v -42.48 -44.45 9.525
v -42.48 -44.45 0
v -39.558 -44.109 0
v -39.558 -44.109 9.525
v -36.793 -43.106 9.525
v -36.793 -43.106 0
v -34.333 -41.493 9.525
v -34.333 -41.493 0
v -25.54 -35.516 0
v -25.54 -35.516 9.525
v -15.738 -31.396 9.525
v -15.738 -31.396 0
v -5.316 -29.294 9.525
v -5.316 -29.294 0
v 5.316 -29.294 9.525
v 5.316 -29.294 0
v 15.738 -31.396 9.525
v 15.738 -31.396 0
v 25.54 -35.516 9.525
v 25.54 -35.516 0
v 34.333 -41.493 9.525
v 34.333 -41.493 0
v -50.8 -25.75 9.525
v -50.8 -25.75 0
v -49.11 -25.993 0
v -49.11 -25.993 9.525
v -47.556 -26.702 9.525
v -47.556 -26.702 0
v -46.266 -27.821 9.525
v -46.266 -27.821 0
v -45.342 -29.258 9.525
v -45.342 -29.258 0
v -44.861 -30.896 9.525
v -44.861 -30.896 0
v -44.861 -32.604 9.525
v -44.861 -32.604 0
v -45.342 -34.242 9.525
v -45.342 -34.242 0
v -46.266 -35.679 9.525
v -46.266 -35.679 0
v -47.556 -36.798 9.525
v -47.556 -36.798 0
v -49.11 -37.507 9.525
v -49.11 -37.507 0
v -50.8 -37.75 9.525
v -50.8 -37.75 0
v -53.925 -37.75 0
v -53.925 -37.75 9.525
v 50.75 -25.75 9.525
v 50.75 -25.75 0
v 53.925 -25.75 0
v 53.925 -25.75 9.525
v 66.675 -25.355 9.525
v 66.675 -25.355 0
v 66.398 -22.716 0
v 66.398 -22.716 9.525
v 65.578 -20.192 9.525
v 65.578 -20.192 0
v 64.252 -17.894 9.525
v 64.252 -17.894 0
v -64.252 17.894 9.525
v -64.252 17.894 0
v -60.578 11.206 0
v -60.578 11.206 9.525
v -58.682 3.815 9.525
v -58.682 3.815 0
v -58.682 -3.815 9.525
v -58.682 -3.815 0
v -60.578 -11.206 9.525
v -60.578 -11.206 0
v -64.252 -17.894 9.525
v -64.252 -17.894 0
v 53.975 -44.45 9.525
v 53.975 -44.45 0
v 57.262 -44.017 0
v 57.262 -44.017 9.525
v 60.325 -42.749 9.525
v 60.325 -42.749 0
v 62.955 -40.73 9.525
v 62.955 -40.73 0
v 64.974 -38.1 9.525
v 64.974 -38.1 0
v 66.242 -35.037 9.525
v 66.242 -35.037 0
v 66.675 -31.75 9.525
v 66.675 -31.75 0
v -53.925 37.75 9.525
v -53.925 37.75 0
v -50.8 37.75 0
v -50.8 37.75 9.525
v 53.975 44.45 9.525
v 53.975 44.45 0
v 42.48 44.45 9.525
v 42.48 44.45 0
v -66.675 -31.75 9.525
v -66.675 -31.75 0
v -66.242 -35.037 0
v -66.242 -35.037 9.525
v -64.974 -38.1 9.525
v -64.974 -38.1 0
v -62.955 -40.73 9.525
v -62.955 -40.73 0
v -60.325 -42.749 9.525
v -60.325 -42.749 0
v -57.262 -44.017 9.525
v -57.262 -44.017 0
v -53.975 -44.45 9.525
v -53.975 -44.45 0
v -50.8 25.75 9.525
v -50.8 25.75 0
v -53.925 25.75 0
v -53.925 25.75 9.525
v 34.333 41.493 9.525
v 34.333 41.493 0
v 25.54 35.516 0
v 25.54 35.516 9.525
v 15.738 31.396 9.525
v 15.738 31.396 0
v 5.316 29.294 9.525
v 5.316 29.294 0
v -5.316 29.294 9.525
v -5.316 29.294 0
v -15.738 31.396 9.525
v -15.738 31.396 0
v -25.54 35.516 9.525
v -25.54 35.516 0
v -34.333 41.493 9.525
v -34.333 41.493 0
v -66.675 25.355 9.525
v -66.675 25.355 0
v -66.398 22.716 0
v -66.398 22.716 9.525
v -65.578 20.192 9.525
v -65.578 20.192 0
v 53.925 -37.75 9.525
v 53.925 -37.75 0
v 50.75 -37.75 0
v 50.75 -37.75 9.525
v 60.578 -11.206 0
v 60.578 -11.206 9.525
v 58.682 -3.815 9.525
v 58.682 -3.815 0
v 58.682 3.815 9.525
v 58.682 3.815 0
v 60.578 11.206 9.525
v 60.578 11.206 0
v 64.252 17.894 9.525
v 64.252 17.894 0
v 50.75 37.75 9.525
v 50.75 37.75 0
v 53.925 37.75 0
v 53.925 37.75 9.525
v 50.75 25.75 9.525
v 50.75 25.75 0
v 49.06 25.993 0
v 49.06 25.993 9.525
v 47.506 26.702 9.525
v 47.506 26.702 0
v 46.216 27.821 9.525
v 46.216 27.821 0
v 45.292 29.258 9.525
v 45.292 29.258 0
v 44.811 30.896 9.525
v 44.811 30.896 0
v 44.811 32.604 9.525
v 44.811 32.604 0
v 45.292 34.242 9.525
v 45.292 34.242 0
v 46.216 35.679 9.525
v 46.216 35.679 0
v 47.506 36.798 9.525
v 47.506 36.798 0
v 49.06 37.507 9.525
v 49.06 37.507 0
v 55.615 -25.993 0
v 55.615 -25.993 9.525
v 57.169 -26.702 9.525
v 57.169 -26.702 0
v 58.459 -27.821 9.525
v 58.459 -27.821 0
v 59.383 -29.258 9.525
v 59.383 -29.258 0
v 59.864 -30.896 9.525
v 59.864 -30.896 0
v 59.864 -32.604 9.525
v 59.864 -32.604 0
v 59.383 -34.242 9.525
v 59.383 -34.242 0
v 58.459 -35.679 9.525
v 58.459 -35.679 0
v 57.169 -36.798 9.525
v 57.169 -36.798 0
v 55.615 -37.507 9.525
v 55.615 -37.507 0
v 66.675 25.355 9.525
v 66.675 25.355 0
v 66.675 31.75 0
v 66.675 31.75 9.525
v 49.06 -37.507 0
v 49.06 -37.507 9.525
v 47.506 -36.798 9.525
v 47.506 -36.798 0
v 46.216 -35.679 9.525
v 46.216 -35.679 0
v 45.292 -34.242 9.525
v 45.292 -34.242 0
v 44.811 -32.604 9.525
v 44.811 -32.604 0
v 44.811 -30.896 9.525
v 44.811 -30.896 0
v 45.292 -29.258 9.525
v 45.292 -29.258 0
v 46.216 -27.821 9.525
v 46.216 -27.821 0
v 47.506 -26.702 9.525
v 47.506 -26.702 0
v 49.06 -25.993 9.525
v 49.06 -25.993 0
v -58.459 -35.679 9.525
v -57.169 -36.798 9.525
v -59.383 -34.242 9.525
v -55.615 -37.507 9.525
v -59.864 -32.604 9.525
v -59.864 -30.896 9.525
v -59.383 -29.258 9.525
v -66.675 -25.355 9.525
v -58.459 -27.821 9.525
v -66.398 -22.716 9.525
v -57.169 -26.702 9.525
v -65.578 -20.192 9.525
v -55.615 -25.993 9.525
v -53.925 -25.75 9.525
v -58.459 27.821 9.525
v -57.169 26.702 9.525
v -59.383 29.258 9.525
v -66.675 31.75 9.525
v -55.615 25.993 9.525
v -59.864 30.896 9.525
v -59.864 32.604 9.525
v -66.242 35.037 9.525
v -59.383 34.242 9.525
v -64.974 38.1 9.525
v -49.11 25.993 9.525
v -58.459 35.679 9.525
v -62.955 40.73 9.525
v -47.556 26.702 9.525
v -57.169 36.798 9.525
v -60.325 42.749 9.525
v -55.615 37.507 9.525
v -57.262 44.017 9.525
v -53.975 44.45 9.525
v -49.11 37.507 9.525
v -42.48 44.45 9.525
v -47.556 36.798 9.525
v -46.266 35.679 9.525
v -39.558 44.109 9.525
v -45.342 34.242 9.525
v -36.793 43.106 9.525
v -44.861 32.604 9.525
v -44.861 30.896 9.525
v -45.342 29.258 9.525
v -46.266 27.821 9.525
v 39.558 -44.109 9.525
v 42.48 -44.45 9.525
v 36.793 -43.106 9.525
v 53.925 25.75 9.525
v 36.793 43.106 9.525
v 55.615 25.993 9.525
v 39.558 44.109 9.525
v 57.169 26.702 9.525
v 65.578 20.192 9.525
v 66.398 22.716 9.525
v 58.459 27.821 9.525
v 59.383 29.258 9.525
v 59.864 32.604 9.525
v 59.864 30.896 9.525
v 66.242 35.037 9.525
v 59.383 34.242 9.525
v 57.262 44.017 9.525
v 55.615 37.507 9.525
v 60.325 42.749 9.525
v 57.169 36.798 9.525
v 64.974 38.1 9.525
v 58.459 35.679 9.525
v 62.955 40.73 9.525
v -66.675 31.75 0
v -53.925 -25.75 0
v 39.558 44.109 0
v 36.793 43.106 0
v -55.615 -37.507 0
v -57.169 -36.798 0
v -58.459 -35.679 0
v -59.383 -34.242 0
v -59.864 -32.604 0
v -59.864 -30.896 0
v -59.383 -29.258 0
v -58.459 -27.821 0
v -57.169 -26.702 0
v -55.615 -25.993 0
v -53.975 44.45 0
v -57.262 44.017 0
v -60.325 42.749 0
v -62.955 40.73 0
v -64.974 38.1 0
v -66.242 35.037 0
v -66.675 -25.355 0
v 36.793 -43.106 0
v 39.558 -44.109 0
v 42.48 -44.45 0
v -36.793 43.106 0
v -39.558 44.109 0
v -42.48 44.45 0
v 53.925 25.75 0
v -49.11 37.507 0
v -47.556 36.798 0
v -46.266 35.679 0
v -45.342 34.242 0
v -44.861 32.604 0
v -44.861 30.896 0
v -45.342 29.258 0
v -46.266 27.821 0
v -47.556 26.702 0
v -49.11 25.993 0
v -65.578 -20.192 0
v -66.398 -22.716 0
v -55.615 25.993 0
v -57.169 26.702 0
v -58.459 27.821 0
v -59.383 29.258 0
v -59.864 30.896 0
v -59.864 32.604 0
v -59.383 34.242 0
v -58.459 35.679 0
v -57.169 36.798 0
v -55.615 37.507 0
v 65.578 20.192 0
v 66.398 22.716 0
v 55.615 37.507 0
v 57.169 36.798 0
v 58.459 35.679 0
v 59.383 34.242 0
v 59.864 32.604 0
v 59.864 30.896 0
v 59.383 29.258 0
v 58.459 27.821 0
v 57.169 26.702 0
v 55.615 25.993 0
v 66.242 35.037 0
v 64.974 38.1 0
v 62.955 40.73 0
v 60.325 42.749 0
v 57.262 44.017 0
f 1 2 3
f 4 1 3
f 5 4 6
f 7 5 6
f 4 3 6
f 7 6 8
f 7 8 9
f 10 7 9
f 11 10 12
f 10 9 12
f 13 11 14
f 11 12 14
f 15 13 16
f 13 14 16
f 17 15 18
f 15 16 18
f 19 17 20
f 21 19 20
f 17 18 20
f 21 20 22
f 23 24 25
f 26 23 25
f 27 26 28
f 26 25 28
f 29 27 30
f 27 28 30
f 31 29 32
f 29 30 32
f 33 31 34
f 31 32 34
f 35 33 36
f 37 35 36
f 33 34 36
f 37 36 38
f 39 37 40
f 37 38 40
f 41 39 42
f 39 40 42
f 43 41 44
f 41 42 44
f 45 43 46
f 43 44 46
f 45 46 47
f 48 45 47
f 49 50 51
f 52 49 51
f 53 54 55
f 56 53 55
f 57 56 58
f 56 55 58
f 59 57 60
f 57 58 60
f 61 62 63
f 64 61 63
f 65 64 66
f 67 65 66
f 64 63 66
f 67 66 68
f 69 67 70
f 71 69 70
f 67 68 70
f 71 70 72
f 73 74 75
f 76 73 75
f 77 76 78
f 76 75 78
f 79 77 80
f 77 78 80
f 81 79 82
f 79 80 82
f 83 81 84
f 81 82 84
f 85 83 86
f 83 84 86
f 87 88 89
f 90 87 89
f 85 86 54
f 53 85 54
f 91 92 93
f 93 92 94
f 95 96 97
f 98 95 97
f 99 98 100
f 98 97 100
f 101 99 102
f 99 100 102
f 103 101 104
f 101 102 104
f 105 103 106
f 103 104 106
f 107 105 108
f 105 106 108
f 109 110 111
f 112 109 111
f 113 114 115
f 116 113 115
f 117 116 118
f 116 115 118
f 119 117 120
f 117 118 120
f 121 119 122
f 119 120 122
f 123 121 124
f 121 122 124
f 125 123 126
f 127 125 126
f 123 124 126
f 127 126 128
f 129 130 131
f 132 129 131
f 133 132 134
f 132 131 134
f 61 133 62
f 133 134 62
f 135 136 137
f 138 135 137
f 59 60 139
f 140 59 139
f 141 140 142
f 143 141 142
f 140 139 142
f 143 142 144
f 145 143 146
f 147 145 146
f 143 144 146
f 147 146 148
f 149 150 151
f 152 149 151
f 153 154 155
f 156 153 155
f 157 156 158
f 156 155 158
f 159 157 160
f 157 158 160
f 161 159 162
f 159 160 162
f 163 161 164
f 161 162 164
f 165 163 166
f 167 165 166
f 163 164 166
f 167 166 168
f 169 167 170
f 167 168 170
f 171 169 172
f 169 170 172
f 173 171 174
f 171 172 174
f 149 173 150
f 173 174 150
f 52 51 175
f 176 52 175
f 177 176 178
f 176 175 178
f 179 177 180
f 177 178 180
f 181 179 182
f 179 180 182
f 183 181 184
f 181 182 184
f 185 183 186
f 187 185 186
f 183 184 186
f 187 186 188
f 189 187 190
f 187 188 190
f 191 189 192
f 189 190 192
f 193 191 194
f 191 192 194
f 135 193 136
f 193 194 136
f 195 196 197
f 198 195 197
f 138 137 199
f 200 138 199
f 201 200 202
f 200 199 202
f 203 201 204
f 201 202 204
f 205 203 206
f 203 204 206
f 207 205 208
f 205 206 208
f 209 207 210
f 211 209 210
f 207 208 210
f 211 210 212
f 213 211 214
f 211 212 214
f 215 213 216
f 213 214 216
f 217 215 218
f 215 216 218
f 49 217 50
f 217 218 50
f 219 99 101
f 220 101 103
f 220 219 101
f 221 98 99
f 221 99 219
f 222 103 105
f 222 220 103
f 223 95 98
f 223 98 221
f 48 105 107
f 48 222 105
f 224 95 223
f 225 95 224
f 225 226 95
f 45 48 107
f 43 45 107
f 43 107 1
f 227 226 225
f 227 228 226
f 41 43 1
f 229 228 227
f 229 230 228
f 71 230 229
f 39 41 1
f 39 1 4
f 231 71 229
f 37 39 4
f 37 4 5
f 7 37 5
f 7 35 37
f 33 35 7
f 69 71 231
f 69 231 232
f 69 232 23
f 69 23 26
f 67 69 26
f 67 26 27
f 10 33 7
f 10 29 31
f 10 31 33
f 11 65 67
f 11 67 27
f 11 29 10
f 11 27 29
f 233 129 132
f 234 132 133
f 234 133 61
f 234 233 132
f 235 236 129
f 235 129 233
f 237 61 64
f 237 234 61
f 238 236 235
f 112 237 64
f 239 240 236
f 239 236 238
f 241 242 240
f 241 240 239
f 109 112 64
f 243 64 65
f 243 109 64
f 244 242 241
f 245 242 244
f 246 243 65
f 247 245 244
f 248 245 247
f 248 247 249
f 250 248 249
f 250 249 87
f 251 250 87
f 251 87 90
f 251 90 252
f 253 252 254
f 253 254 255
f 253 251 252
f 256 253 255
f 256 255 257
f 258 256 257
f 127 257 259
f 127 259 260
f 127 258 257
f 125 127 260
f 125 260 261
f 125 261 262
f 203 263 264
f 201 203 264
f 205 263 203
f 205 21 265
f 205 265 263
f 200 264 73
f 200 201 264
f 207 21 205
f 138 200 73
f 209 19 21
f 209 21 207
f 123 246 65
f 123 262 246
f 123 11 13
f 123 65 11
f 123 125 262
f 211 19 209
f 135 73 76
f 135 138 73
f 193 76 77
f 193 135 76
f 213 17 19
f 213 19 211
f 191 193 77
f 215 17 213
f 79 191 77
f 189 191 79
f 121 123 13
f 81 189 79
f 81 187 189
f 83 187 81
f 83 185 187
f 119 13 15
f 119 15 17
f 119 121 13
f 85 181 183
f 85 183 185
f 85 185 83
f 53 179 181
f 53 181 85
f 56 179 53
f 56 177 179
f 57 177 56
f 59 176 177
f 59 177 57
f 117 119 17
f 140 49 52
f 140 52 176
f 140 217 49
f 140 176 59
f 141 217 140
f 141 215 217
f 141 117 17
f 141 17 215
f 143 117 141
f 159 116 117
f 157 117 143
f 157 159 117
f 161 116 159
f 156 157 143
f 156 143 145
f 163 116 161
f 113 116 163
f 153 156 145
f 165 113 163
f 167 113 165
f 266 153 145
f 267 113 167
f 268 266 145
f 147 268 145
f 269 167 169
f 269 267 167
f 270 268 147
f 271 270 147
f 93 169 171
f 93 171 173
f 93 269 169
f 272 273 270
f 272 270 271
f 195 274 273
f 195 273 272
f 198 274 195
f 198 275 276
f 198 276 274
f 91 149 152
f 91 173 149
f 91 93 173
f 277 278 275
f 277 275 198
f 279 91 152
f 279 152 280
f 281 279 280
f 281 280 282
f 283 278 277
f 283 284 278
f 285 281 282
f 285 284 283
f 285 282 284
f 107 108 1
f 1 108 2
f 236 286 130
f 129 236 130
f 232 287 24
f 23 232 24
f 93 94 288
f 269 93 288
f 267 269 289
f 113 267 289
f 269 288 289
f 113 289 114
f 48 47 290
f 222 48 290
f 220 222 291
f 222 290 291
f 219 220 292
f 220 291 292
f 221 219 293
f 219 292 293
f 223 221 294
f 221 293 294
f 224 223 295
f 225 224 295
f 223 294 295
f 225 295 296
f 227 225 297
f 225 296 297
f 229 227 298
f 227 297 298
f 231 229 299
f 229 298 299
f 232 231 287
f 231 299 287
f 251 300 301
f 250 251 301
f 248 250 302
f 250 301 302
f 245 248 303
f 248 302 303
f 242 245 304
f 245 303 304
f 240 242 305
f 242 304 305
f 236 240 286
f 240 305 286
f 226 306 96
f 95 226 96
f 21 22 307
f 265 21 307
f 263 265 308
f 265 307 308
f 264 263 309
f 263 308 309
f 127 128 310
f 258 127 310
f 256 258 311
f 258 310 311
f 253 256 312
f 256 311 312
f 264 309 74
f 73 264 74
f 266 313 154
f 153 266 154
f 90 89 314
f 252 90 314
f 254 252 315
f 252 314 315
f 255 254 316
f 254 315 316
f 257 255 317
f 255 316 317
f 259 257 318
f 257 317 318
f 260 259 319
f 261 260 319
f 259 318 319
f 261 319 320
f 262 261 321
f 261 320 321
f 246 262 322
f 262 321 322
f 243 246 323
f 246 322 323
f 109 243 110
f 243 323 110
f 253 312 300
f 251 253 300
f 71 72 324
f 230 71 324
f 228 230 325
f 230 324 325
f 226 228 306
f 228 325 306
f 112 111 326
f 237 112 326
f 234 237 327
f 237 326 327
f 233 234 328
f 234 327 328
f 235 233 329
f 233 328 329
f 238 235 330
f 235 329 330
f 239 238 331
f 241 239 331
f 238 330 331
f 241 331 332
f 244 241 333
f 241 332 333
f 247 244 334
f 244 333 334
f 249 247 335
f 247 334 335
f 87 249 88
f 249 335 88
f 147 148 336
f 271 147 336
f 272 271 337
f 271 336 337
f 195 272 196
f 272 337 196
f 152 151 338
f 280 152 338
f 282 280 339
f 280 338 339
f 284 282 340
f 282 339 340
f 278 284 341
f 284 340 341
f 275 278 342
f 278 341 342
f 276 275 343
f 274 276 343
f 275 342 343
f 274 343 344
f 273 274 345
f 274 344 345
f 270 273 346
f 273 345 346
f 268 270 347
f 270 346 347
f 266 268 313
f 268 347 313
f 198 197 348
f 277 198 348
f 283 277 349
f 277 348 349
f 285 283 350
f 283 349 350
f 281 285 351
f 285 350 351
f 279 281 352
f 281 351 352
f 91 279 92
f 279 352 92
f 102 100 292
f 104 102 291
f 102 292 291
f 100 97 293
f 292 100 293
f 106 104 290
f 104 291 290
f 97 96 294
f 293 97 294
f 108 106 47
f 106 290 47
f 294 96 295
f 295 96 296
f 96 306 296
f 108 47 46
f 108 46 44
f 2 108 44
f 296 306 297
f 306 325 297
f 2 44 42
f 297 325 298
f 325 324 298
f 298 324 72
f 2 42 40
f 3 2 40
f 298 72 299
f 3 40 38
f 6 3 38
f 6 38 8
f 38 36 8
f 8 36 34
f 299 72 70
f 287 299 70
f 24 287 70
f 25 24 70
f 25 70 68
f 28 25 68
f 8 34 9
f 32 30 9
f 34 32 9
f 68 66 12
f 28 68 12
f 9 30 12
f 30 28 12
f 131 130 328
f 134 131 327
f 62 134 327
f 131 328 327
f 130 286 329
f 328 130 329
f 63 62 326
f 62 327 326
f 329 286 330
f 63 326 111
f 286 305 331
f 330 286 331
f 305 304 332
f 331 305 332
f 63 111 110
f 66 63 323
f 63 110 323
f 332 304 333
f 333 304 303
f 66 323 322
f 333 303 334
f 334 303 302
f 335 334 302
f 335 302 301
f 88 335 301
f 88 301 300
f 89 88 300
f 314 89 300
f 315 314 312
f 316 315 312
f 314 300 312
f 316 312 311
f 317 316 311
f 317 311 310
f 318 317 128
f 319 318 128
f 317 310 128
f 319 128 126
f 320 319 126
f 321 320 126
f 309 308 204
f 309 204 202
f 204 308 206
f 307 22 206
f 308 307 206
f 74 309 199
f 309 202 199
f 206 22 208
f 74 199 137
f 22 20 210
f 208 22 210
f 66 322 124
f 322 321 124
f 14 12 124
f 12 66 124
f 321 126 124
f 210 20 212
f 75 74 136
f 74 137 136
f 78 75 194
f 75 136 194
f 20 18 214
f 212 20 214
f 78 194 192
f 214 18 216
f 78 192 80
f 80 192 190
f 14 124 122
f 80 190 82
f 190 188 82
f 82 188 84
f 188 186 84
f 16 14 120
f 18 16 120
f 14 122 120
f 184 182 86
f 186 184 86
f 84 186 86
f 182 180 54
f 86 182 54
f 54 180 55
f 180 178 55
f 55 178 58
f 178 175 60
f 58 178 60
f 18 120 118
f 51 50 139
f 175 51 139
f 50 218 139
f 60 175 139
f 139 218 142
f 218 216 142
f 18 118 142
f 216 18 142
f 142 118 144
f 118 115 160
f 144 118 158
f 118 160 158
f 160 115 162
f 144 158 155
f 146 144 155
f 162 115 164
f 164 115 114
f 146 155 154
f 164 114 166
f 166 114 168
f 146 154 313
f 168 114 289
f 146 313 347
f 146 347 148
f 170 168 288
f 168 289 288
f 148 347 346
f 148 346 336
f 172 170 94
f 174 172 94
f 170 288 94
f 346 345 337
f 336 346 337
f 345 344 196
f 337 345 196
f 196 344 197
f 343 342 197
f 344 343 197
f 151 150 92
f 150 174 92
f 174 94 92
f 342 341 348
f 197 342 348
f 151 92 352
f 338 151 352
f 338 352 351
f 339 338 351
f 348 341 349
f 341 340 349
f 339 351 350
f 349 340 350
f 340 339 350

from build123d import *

# Parameters (mm, degrees)
F1_DEPTH = 9.525


with BuildPart() as f1:
    # F0 (on Top) → F1 (new body)
    with BuildSketch(Plane.XY):
        with BuildLine():
            ThreePointArc((66.675, 31.75), (62.955256, 40.730256), (53.975, 44.45))
            Line((53.975, 44.45), (42.480119, 44.45))
            ThreePointArc((42.480119, 44.45), (38.146553, 43.687764), (34.333175, 41.492551))
            ThreePointArc((34.333175, 41.492551), (0, 29.029153), (-34.333175, 41.492551))
            ThreePointArc((-34.333175, 41.492551), (-38.146553, 43.687764), (-42.480119, 44.45))
            Line((-42.480119, 44.45), (-53.975, 44.45))
            ThreePointArc((-53.975, 44.45), (-62.955256, 40.730256), (-66.675, 31.75))
            Line((-66.675, 31.75), (-66.675, 25.355166))
            ThreePointArc((-66.675, 25.355166), (-66.054129, 21.432839), (-64.25222, 17.894017))
            ThreePointArc((-64.25222, 17.894017), (-58.441686, 0), (-64.25222, -17.894017))
            ThreePointArc((-64.25222, -17.894017), (-66.054129, -21.432839), (-66.675, -25.355166))
            Line((-66.675, -25.355166), (-66.675, -31.75))
            ThreePointArc((-66.675, -31.75), (-62.955256, -40.730256), (-53.975, -44.45))
            Line((-53.975, -44.45), (-42.480119, -44.45))
            ThreePointArc((-42.480119, -44.45), (-38.146553, -43.687764), (-34.333175, -41.492551))
            ThreePointArc((-34.333175, -41.492551), (0, -29.029153), (34.333175, -41.492551))
            ThreePointArc((34.333175, -41.492551), (38.146553, -43.687764), (42.480119, -44.45))
            Line((42.480119, -44.45), (53.975, -44.45))
            ThreePointArc((53.975, -44.45), (62.955256, -40.730256), (66.675, -31.75))
            Line((66.675, -31.75), (66.675, -25.355166))
            ThreePointArc((66.675, -25.355166), (66.054129, -21.432839), (64.25222, -17.894017))
            ThreePointArc((64.25222, -17.894017), (58.441686, 0), (64.25222, 17.894017))
            ThreePointArc((64.25222, 17.894017), (66.054129, 21.432839), (66.675, 25.355166))
            Line((66.675, 25.355166), (66.675, 31.75))
        make_face()
        with BuildLine():
            ThreePointArc((-53.925, -37.75), (-59.925, -31.75), (-53.925, -25.75))
            Line((-53.925, -25.75), (-50.8, -25.75))
            ThreePointArc((-50.8, -25.75), (-44.8, -31.75), (-50.8, -37.75))
            Line((-50.8, -37.75), (-53.925, -37.75))
        make_face(mode=Mode.SUBTRACT)
        with BuildLine():
            ThreePointArc((53.925, -25.75), (59.925, -31.75), (53.925, -37.75))
            Line((53.925, -37.75), (50.75, -37.75))
            ThreePointArc((50.75, -37.75), (44.75, -31.75), (50.75, -25.75))
            Line((50.75, -25.75), (53.925, -25.75))
        make_face(mode=Mode.SUBTRACT)
        with BuildLine():
            ThreePointArc((-53.925, 25.75), (-59.925, 31.75), (-53.925, 37.75))
            Line((-53.925, 37.75), (-50.8, 37.75))
            ThreePointArc((-50.8, 37.75), (-44.8, 31.75), (-50.8, 25.75))
            Line((-50.8, 25.75), (-53.925, 25.75))
        make_face(mode=Mode.SUBTRACT)
        with BuildLine():
            ThreePointArc((53.925, 37.75), (59.925, 31.75), (53.925, 25.75))
            Line((53.925, 25.75), (50.75, 25.75))
            ThreePointArc((50.75, 25.75), (44.75, 31.75), (50.75, 37.75))
            Line((50.75, 37.75), (53.925, 37.75))
        make_face(mode=Mode.SUBTRACT)
    extrude(amount=F1_DEPTH)


solid = f1.part
